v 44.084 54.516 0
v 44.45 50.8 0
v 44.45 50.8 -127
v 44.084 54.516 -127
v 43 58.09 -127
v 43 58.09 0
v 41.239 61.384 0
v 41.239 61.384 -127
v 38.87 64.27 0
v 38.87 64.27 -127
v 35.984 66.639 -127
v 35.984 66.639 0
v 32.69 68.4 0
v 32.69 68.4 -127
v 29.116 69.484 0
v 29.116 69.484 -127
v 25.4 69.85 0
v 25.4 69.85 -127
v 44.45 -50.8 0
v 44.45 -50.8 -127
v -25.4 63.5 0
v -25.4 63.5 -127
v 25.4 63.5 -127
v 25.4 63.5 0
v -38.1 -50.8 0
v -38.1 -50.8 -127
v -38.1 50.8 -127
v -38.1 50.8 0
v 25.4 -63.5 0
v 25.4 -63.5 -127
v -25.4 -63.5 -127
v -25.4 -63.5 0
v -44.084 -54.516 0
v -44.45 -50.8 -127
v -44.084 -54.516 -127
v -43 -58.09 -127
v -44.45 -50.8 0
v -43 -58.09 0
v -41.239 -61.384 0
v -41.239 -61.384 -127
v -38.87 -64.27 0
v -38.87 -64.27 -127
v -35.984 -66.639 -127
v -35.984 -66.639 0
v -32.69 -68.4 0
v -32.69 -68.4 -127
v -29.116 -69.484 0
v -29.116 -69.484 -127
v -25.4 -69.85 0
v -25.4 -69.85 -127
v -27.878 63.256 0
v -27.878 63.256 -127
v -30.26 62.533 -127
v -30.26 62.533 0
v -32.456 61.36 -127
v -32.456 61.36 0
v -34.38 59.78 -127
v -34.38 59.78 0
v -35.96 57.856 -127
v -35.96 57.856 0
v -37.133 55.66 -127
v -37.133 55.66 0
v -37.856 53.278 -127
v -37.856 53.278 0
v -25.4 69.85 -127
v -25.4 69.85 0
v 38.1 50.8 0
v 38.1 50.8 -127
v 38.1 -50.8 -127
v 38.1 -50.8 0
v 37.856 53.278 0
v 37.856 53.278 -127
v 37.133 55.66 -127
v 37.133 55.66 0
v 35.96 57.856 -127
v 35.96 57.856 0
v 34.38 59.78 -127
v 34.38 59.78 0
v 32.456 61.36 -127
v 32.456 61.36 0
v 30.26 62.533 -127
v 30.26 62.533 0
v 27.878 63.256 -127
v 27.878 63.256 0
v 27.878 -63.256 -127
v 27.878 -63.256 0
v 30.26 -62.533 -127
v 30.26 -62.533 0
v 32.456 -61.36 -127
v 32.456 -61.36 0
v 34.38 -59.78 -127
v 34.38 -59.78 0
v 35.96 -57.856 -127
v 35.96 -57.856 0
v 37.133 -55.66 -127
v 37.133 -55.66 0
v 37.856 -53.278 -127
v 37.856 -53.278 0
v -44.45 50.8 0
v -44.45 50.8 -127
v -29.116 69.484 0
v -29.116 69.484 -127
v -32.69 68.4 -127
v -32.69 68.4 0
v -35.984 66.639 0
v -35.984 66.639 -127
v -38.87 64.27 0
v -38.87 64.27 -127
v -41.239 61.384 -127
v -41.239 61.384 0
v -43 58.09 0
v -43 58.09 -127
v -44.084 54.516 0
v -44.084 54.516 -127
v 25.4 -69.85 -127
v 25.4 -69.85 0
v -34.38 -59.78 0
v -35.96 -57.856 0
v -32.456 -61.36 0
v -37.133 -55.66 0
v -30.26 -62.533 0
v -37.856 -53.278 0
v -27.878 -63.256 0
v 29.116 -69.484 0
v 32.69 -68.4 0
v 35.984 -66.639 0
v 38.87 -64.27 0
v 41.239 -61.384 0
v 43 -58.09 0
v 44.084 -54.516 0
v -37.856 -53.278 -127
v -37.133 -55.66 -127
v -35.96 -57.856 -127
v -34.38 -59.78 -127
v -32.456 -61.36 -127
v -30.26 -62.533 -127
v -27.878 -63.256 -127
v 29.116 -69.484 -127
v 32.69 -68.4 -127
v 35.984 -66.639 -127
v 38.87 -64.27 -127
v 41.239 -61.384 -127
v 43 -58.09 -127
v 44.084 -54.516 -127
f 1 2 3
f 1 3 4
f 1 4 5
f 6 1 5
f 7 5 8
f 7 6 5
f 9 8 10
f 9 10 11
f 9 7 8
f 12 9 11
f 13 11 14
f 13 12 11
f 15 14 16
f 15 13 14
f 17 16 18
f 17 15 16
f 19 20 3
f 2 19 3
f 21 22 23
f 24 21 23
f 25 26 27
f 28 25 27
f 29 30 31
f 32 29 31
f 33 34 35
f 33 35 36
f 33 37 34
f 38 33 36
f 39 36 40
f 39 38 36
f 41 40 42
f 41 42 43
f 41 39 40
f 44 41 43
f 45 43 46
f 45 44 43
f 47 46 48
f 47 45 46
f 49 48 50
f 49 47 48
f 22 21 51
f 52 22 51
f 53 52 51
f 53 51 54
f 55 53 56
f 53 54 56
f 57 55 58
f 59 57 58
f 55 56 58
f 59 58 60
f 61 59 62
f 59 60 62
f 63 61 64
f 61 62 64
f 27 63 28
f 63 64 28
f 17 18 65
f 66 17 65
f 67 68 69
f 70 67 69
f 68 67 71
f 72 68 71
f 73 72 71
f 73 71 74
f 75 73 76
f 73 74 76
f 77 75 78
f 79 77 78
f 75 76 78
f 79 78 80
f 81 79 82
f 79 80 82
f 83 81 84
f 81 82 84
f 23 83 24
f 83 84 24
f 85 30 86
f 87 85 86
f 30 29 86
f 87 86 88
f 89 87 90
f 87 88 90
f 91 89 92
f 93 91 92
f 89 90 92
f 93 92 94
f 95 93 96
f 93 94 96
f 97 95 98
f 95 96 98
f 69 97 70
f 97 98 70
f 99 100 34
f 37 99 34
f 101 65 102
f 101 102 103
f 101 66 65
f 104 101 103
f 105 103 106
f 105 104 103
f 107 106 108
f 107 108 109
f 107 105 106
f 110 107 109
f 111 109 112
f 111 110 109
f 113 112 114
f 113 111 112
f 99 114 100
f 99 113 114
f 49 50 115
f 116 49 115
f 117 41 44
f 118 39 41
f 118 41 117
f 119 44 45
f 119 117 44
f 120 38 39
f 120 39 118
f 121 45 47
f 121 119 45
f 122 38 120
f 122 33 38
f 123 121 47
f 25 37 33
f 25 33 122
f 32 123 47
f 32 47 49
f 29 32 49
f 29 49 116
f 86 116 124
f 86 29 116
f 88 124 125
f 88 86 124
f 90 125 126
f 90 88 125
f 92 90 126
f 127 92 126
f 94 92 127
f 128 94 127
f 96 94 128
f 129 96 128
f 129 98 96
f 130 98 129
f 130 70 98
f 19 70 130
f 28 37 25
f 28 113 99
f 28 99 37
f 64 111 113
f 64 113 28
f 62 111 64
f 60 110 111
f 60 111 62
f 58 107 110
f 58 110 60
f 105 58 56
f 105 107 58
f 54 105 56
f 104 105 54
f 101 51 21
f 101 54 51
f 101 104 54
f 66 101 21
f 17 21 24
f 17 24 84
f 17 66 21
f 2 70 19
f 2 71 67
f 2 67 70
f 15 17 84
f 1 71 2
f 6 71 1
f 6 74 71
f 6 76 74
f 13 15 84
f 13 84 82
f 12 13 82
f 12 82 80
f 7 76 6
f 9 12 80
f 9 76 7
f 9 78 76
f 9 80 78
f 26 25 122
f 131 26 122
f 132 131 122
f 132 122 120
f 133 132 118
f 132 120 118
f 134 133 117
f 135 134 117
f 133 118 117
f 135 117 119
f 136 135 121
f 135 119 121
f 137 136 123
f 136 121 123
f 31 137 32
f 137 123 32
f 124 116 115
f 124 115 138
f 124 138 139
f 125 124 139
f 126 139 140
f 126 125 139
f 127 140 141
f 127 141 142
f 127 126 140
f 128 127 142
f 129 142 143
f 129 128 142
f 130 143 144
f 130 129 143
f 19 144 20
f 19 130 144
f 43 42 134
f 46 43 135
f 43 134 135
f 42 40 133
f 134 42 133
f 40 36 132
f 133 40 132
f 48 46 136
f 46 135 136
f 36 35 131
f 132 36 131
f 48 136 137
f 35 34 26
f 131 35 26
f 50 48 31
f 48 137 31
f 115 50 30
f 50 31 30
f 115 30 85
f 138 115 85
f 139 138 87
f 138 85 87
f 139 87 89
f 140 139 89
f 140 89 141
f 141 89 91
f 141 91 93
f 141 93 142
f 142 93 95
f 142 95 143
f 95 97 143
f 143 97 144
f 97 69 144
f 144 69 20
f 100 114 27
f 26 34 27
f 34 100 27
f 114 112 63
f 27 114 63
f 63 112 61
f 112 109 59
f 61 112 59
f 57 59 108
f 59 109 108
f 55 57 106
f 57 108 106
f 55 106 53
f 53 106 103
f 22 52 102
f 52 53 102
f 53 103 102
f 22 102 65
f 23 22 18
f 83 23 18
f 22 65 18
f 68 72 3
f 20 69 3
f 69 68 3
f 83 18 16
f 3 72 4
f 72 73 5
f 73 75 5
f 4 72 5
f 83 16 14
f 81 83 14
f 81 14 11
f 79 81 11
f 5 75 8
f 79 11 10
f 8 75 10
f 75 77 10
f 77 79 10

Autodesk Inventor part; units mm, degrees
ref_plane "YZ Plane" through (0, 0, 0) normal (1, 0, 0) x (0, 1, 0)
ref_plane "XZ Plane" through (0, 0, 0) normal (0, 1, 0) x (-1, 0, 0)
ref_plane "XY Plane" through (0, 0, 0) normal (0, 0, 1) x (1, 0, 0)
sketch "Sketch1" plane through (0, 0, 0) normal (0, 0, 1) x (1, 0, 0)
  line L0 (-25.4, 63.5) -> (25.4, 63.5)
  line L1 (38.1, 50.8) -> (38.1, -50.8)
  line L2 (25.4, -63.5) -> (-25.4, -63.5)
  line L3 (-38.1, -50.8) -> (-38.1, 50.8)
  line L4 (-38.1, 63.5) -> (38.1, -63.5) construction
  line L5 (38.1, 63.5) -> (-38.1, -63.5) construction
  arc A0 (-25.4, 63.5) -> (-38.1, 50.8) centre (-25.4, 50.8) ccw
  arc A1 (38.1, 50.8) -> (25.4, 63.5) centre (25.4, 50.8) ccw
  arc A2 (25.4, -63.5) -> (38.1, -50.8) centre (25.4, -50.8) ccw
  arc A3 (-38.1, -50.8) -> (-25.4, -63.5) centre (-25.4, -50.8) ccw
  line L6 (25.4, 69.85) -> (-25.4, 69.85)
  arc A4 (-25.4, 69.85) -> (-44.45, 50.8) centre (-25.4, 50.8) ccw
  line L7 (-44.45, 50.8) -> (-44.45, -50.8)
  arc A5 (-44.45, -50.8) -> (-25.4, -69.85) centre (-25.4, -50.8) ccw
  line L8 (-25.4, -69.85) -> (25.4, -69.85)
  arc A6 (25.4, -69.85) -> (44.45, -50.8) centre (25.4, -50.8) ccw
  line L9 (44.45, -50.8) -> (44.45, 50.8)
  arc A7 (44.45, 50.8) -> (25.4, 69.85) centre (25.4, 50.8) ccw
  point P0 (0, 0)
  dimension "d0" = 127
  dimension "d1" = 76.2
  dimension "d2" = 12.7
  dimension "d3" = 6.35
extrude "Extrusion1" add sketch "Sketch1" against normal blind 127
properties part number "class1" material "Iron, Ductile"
